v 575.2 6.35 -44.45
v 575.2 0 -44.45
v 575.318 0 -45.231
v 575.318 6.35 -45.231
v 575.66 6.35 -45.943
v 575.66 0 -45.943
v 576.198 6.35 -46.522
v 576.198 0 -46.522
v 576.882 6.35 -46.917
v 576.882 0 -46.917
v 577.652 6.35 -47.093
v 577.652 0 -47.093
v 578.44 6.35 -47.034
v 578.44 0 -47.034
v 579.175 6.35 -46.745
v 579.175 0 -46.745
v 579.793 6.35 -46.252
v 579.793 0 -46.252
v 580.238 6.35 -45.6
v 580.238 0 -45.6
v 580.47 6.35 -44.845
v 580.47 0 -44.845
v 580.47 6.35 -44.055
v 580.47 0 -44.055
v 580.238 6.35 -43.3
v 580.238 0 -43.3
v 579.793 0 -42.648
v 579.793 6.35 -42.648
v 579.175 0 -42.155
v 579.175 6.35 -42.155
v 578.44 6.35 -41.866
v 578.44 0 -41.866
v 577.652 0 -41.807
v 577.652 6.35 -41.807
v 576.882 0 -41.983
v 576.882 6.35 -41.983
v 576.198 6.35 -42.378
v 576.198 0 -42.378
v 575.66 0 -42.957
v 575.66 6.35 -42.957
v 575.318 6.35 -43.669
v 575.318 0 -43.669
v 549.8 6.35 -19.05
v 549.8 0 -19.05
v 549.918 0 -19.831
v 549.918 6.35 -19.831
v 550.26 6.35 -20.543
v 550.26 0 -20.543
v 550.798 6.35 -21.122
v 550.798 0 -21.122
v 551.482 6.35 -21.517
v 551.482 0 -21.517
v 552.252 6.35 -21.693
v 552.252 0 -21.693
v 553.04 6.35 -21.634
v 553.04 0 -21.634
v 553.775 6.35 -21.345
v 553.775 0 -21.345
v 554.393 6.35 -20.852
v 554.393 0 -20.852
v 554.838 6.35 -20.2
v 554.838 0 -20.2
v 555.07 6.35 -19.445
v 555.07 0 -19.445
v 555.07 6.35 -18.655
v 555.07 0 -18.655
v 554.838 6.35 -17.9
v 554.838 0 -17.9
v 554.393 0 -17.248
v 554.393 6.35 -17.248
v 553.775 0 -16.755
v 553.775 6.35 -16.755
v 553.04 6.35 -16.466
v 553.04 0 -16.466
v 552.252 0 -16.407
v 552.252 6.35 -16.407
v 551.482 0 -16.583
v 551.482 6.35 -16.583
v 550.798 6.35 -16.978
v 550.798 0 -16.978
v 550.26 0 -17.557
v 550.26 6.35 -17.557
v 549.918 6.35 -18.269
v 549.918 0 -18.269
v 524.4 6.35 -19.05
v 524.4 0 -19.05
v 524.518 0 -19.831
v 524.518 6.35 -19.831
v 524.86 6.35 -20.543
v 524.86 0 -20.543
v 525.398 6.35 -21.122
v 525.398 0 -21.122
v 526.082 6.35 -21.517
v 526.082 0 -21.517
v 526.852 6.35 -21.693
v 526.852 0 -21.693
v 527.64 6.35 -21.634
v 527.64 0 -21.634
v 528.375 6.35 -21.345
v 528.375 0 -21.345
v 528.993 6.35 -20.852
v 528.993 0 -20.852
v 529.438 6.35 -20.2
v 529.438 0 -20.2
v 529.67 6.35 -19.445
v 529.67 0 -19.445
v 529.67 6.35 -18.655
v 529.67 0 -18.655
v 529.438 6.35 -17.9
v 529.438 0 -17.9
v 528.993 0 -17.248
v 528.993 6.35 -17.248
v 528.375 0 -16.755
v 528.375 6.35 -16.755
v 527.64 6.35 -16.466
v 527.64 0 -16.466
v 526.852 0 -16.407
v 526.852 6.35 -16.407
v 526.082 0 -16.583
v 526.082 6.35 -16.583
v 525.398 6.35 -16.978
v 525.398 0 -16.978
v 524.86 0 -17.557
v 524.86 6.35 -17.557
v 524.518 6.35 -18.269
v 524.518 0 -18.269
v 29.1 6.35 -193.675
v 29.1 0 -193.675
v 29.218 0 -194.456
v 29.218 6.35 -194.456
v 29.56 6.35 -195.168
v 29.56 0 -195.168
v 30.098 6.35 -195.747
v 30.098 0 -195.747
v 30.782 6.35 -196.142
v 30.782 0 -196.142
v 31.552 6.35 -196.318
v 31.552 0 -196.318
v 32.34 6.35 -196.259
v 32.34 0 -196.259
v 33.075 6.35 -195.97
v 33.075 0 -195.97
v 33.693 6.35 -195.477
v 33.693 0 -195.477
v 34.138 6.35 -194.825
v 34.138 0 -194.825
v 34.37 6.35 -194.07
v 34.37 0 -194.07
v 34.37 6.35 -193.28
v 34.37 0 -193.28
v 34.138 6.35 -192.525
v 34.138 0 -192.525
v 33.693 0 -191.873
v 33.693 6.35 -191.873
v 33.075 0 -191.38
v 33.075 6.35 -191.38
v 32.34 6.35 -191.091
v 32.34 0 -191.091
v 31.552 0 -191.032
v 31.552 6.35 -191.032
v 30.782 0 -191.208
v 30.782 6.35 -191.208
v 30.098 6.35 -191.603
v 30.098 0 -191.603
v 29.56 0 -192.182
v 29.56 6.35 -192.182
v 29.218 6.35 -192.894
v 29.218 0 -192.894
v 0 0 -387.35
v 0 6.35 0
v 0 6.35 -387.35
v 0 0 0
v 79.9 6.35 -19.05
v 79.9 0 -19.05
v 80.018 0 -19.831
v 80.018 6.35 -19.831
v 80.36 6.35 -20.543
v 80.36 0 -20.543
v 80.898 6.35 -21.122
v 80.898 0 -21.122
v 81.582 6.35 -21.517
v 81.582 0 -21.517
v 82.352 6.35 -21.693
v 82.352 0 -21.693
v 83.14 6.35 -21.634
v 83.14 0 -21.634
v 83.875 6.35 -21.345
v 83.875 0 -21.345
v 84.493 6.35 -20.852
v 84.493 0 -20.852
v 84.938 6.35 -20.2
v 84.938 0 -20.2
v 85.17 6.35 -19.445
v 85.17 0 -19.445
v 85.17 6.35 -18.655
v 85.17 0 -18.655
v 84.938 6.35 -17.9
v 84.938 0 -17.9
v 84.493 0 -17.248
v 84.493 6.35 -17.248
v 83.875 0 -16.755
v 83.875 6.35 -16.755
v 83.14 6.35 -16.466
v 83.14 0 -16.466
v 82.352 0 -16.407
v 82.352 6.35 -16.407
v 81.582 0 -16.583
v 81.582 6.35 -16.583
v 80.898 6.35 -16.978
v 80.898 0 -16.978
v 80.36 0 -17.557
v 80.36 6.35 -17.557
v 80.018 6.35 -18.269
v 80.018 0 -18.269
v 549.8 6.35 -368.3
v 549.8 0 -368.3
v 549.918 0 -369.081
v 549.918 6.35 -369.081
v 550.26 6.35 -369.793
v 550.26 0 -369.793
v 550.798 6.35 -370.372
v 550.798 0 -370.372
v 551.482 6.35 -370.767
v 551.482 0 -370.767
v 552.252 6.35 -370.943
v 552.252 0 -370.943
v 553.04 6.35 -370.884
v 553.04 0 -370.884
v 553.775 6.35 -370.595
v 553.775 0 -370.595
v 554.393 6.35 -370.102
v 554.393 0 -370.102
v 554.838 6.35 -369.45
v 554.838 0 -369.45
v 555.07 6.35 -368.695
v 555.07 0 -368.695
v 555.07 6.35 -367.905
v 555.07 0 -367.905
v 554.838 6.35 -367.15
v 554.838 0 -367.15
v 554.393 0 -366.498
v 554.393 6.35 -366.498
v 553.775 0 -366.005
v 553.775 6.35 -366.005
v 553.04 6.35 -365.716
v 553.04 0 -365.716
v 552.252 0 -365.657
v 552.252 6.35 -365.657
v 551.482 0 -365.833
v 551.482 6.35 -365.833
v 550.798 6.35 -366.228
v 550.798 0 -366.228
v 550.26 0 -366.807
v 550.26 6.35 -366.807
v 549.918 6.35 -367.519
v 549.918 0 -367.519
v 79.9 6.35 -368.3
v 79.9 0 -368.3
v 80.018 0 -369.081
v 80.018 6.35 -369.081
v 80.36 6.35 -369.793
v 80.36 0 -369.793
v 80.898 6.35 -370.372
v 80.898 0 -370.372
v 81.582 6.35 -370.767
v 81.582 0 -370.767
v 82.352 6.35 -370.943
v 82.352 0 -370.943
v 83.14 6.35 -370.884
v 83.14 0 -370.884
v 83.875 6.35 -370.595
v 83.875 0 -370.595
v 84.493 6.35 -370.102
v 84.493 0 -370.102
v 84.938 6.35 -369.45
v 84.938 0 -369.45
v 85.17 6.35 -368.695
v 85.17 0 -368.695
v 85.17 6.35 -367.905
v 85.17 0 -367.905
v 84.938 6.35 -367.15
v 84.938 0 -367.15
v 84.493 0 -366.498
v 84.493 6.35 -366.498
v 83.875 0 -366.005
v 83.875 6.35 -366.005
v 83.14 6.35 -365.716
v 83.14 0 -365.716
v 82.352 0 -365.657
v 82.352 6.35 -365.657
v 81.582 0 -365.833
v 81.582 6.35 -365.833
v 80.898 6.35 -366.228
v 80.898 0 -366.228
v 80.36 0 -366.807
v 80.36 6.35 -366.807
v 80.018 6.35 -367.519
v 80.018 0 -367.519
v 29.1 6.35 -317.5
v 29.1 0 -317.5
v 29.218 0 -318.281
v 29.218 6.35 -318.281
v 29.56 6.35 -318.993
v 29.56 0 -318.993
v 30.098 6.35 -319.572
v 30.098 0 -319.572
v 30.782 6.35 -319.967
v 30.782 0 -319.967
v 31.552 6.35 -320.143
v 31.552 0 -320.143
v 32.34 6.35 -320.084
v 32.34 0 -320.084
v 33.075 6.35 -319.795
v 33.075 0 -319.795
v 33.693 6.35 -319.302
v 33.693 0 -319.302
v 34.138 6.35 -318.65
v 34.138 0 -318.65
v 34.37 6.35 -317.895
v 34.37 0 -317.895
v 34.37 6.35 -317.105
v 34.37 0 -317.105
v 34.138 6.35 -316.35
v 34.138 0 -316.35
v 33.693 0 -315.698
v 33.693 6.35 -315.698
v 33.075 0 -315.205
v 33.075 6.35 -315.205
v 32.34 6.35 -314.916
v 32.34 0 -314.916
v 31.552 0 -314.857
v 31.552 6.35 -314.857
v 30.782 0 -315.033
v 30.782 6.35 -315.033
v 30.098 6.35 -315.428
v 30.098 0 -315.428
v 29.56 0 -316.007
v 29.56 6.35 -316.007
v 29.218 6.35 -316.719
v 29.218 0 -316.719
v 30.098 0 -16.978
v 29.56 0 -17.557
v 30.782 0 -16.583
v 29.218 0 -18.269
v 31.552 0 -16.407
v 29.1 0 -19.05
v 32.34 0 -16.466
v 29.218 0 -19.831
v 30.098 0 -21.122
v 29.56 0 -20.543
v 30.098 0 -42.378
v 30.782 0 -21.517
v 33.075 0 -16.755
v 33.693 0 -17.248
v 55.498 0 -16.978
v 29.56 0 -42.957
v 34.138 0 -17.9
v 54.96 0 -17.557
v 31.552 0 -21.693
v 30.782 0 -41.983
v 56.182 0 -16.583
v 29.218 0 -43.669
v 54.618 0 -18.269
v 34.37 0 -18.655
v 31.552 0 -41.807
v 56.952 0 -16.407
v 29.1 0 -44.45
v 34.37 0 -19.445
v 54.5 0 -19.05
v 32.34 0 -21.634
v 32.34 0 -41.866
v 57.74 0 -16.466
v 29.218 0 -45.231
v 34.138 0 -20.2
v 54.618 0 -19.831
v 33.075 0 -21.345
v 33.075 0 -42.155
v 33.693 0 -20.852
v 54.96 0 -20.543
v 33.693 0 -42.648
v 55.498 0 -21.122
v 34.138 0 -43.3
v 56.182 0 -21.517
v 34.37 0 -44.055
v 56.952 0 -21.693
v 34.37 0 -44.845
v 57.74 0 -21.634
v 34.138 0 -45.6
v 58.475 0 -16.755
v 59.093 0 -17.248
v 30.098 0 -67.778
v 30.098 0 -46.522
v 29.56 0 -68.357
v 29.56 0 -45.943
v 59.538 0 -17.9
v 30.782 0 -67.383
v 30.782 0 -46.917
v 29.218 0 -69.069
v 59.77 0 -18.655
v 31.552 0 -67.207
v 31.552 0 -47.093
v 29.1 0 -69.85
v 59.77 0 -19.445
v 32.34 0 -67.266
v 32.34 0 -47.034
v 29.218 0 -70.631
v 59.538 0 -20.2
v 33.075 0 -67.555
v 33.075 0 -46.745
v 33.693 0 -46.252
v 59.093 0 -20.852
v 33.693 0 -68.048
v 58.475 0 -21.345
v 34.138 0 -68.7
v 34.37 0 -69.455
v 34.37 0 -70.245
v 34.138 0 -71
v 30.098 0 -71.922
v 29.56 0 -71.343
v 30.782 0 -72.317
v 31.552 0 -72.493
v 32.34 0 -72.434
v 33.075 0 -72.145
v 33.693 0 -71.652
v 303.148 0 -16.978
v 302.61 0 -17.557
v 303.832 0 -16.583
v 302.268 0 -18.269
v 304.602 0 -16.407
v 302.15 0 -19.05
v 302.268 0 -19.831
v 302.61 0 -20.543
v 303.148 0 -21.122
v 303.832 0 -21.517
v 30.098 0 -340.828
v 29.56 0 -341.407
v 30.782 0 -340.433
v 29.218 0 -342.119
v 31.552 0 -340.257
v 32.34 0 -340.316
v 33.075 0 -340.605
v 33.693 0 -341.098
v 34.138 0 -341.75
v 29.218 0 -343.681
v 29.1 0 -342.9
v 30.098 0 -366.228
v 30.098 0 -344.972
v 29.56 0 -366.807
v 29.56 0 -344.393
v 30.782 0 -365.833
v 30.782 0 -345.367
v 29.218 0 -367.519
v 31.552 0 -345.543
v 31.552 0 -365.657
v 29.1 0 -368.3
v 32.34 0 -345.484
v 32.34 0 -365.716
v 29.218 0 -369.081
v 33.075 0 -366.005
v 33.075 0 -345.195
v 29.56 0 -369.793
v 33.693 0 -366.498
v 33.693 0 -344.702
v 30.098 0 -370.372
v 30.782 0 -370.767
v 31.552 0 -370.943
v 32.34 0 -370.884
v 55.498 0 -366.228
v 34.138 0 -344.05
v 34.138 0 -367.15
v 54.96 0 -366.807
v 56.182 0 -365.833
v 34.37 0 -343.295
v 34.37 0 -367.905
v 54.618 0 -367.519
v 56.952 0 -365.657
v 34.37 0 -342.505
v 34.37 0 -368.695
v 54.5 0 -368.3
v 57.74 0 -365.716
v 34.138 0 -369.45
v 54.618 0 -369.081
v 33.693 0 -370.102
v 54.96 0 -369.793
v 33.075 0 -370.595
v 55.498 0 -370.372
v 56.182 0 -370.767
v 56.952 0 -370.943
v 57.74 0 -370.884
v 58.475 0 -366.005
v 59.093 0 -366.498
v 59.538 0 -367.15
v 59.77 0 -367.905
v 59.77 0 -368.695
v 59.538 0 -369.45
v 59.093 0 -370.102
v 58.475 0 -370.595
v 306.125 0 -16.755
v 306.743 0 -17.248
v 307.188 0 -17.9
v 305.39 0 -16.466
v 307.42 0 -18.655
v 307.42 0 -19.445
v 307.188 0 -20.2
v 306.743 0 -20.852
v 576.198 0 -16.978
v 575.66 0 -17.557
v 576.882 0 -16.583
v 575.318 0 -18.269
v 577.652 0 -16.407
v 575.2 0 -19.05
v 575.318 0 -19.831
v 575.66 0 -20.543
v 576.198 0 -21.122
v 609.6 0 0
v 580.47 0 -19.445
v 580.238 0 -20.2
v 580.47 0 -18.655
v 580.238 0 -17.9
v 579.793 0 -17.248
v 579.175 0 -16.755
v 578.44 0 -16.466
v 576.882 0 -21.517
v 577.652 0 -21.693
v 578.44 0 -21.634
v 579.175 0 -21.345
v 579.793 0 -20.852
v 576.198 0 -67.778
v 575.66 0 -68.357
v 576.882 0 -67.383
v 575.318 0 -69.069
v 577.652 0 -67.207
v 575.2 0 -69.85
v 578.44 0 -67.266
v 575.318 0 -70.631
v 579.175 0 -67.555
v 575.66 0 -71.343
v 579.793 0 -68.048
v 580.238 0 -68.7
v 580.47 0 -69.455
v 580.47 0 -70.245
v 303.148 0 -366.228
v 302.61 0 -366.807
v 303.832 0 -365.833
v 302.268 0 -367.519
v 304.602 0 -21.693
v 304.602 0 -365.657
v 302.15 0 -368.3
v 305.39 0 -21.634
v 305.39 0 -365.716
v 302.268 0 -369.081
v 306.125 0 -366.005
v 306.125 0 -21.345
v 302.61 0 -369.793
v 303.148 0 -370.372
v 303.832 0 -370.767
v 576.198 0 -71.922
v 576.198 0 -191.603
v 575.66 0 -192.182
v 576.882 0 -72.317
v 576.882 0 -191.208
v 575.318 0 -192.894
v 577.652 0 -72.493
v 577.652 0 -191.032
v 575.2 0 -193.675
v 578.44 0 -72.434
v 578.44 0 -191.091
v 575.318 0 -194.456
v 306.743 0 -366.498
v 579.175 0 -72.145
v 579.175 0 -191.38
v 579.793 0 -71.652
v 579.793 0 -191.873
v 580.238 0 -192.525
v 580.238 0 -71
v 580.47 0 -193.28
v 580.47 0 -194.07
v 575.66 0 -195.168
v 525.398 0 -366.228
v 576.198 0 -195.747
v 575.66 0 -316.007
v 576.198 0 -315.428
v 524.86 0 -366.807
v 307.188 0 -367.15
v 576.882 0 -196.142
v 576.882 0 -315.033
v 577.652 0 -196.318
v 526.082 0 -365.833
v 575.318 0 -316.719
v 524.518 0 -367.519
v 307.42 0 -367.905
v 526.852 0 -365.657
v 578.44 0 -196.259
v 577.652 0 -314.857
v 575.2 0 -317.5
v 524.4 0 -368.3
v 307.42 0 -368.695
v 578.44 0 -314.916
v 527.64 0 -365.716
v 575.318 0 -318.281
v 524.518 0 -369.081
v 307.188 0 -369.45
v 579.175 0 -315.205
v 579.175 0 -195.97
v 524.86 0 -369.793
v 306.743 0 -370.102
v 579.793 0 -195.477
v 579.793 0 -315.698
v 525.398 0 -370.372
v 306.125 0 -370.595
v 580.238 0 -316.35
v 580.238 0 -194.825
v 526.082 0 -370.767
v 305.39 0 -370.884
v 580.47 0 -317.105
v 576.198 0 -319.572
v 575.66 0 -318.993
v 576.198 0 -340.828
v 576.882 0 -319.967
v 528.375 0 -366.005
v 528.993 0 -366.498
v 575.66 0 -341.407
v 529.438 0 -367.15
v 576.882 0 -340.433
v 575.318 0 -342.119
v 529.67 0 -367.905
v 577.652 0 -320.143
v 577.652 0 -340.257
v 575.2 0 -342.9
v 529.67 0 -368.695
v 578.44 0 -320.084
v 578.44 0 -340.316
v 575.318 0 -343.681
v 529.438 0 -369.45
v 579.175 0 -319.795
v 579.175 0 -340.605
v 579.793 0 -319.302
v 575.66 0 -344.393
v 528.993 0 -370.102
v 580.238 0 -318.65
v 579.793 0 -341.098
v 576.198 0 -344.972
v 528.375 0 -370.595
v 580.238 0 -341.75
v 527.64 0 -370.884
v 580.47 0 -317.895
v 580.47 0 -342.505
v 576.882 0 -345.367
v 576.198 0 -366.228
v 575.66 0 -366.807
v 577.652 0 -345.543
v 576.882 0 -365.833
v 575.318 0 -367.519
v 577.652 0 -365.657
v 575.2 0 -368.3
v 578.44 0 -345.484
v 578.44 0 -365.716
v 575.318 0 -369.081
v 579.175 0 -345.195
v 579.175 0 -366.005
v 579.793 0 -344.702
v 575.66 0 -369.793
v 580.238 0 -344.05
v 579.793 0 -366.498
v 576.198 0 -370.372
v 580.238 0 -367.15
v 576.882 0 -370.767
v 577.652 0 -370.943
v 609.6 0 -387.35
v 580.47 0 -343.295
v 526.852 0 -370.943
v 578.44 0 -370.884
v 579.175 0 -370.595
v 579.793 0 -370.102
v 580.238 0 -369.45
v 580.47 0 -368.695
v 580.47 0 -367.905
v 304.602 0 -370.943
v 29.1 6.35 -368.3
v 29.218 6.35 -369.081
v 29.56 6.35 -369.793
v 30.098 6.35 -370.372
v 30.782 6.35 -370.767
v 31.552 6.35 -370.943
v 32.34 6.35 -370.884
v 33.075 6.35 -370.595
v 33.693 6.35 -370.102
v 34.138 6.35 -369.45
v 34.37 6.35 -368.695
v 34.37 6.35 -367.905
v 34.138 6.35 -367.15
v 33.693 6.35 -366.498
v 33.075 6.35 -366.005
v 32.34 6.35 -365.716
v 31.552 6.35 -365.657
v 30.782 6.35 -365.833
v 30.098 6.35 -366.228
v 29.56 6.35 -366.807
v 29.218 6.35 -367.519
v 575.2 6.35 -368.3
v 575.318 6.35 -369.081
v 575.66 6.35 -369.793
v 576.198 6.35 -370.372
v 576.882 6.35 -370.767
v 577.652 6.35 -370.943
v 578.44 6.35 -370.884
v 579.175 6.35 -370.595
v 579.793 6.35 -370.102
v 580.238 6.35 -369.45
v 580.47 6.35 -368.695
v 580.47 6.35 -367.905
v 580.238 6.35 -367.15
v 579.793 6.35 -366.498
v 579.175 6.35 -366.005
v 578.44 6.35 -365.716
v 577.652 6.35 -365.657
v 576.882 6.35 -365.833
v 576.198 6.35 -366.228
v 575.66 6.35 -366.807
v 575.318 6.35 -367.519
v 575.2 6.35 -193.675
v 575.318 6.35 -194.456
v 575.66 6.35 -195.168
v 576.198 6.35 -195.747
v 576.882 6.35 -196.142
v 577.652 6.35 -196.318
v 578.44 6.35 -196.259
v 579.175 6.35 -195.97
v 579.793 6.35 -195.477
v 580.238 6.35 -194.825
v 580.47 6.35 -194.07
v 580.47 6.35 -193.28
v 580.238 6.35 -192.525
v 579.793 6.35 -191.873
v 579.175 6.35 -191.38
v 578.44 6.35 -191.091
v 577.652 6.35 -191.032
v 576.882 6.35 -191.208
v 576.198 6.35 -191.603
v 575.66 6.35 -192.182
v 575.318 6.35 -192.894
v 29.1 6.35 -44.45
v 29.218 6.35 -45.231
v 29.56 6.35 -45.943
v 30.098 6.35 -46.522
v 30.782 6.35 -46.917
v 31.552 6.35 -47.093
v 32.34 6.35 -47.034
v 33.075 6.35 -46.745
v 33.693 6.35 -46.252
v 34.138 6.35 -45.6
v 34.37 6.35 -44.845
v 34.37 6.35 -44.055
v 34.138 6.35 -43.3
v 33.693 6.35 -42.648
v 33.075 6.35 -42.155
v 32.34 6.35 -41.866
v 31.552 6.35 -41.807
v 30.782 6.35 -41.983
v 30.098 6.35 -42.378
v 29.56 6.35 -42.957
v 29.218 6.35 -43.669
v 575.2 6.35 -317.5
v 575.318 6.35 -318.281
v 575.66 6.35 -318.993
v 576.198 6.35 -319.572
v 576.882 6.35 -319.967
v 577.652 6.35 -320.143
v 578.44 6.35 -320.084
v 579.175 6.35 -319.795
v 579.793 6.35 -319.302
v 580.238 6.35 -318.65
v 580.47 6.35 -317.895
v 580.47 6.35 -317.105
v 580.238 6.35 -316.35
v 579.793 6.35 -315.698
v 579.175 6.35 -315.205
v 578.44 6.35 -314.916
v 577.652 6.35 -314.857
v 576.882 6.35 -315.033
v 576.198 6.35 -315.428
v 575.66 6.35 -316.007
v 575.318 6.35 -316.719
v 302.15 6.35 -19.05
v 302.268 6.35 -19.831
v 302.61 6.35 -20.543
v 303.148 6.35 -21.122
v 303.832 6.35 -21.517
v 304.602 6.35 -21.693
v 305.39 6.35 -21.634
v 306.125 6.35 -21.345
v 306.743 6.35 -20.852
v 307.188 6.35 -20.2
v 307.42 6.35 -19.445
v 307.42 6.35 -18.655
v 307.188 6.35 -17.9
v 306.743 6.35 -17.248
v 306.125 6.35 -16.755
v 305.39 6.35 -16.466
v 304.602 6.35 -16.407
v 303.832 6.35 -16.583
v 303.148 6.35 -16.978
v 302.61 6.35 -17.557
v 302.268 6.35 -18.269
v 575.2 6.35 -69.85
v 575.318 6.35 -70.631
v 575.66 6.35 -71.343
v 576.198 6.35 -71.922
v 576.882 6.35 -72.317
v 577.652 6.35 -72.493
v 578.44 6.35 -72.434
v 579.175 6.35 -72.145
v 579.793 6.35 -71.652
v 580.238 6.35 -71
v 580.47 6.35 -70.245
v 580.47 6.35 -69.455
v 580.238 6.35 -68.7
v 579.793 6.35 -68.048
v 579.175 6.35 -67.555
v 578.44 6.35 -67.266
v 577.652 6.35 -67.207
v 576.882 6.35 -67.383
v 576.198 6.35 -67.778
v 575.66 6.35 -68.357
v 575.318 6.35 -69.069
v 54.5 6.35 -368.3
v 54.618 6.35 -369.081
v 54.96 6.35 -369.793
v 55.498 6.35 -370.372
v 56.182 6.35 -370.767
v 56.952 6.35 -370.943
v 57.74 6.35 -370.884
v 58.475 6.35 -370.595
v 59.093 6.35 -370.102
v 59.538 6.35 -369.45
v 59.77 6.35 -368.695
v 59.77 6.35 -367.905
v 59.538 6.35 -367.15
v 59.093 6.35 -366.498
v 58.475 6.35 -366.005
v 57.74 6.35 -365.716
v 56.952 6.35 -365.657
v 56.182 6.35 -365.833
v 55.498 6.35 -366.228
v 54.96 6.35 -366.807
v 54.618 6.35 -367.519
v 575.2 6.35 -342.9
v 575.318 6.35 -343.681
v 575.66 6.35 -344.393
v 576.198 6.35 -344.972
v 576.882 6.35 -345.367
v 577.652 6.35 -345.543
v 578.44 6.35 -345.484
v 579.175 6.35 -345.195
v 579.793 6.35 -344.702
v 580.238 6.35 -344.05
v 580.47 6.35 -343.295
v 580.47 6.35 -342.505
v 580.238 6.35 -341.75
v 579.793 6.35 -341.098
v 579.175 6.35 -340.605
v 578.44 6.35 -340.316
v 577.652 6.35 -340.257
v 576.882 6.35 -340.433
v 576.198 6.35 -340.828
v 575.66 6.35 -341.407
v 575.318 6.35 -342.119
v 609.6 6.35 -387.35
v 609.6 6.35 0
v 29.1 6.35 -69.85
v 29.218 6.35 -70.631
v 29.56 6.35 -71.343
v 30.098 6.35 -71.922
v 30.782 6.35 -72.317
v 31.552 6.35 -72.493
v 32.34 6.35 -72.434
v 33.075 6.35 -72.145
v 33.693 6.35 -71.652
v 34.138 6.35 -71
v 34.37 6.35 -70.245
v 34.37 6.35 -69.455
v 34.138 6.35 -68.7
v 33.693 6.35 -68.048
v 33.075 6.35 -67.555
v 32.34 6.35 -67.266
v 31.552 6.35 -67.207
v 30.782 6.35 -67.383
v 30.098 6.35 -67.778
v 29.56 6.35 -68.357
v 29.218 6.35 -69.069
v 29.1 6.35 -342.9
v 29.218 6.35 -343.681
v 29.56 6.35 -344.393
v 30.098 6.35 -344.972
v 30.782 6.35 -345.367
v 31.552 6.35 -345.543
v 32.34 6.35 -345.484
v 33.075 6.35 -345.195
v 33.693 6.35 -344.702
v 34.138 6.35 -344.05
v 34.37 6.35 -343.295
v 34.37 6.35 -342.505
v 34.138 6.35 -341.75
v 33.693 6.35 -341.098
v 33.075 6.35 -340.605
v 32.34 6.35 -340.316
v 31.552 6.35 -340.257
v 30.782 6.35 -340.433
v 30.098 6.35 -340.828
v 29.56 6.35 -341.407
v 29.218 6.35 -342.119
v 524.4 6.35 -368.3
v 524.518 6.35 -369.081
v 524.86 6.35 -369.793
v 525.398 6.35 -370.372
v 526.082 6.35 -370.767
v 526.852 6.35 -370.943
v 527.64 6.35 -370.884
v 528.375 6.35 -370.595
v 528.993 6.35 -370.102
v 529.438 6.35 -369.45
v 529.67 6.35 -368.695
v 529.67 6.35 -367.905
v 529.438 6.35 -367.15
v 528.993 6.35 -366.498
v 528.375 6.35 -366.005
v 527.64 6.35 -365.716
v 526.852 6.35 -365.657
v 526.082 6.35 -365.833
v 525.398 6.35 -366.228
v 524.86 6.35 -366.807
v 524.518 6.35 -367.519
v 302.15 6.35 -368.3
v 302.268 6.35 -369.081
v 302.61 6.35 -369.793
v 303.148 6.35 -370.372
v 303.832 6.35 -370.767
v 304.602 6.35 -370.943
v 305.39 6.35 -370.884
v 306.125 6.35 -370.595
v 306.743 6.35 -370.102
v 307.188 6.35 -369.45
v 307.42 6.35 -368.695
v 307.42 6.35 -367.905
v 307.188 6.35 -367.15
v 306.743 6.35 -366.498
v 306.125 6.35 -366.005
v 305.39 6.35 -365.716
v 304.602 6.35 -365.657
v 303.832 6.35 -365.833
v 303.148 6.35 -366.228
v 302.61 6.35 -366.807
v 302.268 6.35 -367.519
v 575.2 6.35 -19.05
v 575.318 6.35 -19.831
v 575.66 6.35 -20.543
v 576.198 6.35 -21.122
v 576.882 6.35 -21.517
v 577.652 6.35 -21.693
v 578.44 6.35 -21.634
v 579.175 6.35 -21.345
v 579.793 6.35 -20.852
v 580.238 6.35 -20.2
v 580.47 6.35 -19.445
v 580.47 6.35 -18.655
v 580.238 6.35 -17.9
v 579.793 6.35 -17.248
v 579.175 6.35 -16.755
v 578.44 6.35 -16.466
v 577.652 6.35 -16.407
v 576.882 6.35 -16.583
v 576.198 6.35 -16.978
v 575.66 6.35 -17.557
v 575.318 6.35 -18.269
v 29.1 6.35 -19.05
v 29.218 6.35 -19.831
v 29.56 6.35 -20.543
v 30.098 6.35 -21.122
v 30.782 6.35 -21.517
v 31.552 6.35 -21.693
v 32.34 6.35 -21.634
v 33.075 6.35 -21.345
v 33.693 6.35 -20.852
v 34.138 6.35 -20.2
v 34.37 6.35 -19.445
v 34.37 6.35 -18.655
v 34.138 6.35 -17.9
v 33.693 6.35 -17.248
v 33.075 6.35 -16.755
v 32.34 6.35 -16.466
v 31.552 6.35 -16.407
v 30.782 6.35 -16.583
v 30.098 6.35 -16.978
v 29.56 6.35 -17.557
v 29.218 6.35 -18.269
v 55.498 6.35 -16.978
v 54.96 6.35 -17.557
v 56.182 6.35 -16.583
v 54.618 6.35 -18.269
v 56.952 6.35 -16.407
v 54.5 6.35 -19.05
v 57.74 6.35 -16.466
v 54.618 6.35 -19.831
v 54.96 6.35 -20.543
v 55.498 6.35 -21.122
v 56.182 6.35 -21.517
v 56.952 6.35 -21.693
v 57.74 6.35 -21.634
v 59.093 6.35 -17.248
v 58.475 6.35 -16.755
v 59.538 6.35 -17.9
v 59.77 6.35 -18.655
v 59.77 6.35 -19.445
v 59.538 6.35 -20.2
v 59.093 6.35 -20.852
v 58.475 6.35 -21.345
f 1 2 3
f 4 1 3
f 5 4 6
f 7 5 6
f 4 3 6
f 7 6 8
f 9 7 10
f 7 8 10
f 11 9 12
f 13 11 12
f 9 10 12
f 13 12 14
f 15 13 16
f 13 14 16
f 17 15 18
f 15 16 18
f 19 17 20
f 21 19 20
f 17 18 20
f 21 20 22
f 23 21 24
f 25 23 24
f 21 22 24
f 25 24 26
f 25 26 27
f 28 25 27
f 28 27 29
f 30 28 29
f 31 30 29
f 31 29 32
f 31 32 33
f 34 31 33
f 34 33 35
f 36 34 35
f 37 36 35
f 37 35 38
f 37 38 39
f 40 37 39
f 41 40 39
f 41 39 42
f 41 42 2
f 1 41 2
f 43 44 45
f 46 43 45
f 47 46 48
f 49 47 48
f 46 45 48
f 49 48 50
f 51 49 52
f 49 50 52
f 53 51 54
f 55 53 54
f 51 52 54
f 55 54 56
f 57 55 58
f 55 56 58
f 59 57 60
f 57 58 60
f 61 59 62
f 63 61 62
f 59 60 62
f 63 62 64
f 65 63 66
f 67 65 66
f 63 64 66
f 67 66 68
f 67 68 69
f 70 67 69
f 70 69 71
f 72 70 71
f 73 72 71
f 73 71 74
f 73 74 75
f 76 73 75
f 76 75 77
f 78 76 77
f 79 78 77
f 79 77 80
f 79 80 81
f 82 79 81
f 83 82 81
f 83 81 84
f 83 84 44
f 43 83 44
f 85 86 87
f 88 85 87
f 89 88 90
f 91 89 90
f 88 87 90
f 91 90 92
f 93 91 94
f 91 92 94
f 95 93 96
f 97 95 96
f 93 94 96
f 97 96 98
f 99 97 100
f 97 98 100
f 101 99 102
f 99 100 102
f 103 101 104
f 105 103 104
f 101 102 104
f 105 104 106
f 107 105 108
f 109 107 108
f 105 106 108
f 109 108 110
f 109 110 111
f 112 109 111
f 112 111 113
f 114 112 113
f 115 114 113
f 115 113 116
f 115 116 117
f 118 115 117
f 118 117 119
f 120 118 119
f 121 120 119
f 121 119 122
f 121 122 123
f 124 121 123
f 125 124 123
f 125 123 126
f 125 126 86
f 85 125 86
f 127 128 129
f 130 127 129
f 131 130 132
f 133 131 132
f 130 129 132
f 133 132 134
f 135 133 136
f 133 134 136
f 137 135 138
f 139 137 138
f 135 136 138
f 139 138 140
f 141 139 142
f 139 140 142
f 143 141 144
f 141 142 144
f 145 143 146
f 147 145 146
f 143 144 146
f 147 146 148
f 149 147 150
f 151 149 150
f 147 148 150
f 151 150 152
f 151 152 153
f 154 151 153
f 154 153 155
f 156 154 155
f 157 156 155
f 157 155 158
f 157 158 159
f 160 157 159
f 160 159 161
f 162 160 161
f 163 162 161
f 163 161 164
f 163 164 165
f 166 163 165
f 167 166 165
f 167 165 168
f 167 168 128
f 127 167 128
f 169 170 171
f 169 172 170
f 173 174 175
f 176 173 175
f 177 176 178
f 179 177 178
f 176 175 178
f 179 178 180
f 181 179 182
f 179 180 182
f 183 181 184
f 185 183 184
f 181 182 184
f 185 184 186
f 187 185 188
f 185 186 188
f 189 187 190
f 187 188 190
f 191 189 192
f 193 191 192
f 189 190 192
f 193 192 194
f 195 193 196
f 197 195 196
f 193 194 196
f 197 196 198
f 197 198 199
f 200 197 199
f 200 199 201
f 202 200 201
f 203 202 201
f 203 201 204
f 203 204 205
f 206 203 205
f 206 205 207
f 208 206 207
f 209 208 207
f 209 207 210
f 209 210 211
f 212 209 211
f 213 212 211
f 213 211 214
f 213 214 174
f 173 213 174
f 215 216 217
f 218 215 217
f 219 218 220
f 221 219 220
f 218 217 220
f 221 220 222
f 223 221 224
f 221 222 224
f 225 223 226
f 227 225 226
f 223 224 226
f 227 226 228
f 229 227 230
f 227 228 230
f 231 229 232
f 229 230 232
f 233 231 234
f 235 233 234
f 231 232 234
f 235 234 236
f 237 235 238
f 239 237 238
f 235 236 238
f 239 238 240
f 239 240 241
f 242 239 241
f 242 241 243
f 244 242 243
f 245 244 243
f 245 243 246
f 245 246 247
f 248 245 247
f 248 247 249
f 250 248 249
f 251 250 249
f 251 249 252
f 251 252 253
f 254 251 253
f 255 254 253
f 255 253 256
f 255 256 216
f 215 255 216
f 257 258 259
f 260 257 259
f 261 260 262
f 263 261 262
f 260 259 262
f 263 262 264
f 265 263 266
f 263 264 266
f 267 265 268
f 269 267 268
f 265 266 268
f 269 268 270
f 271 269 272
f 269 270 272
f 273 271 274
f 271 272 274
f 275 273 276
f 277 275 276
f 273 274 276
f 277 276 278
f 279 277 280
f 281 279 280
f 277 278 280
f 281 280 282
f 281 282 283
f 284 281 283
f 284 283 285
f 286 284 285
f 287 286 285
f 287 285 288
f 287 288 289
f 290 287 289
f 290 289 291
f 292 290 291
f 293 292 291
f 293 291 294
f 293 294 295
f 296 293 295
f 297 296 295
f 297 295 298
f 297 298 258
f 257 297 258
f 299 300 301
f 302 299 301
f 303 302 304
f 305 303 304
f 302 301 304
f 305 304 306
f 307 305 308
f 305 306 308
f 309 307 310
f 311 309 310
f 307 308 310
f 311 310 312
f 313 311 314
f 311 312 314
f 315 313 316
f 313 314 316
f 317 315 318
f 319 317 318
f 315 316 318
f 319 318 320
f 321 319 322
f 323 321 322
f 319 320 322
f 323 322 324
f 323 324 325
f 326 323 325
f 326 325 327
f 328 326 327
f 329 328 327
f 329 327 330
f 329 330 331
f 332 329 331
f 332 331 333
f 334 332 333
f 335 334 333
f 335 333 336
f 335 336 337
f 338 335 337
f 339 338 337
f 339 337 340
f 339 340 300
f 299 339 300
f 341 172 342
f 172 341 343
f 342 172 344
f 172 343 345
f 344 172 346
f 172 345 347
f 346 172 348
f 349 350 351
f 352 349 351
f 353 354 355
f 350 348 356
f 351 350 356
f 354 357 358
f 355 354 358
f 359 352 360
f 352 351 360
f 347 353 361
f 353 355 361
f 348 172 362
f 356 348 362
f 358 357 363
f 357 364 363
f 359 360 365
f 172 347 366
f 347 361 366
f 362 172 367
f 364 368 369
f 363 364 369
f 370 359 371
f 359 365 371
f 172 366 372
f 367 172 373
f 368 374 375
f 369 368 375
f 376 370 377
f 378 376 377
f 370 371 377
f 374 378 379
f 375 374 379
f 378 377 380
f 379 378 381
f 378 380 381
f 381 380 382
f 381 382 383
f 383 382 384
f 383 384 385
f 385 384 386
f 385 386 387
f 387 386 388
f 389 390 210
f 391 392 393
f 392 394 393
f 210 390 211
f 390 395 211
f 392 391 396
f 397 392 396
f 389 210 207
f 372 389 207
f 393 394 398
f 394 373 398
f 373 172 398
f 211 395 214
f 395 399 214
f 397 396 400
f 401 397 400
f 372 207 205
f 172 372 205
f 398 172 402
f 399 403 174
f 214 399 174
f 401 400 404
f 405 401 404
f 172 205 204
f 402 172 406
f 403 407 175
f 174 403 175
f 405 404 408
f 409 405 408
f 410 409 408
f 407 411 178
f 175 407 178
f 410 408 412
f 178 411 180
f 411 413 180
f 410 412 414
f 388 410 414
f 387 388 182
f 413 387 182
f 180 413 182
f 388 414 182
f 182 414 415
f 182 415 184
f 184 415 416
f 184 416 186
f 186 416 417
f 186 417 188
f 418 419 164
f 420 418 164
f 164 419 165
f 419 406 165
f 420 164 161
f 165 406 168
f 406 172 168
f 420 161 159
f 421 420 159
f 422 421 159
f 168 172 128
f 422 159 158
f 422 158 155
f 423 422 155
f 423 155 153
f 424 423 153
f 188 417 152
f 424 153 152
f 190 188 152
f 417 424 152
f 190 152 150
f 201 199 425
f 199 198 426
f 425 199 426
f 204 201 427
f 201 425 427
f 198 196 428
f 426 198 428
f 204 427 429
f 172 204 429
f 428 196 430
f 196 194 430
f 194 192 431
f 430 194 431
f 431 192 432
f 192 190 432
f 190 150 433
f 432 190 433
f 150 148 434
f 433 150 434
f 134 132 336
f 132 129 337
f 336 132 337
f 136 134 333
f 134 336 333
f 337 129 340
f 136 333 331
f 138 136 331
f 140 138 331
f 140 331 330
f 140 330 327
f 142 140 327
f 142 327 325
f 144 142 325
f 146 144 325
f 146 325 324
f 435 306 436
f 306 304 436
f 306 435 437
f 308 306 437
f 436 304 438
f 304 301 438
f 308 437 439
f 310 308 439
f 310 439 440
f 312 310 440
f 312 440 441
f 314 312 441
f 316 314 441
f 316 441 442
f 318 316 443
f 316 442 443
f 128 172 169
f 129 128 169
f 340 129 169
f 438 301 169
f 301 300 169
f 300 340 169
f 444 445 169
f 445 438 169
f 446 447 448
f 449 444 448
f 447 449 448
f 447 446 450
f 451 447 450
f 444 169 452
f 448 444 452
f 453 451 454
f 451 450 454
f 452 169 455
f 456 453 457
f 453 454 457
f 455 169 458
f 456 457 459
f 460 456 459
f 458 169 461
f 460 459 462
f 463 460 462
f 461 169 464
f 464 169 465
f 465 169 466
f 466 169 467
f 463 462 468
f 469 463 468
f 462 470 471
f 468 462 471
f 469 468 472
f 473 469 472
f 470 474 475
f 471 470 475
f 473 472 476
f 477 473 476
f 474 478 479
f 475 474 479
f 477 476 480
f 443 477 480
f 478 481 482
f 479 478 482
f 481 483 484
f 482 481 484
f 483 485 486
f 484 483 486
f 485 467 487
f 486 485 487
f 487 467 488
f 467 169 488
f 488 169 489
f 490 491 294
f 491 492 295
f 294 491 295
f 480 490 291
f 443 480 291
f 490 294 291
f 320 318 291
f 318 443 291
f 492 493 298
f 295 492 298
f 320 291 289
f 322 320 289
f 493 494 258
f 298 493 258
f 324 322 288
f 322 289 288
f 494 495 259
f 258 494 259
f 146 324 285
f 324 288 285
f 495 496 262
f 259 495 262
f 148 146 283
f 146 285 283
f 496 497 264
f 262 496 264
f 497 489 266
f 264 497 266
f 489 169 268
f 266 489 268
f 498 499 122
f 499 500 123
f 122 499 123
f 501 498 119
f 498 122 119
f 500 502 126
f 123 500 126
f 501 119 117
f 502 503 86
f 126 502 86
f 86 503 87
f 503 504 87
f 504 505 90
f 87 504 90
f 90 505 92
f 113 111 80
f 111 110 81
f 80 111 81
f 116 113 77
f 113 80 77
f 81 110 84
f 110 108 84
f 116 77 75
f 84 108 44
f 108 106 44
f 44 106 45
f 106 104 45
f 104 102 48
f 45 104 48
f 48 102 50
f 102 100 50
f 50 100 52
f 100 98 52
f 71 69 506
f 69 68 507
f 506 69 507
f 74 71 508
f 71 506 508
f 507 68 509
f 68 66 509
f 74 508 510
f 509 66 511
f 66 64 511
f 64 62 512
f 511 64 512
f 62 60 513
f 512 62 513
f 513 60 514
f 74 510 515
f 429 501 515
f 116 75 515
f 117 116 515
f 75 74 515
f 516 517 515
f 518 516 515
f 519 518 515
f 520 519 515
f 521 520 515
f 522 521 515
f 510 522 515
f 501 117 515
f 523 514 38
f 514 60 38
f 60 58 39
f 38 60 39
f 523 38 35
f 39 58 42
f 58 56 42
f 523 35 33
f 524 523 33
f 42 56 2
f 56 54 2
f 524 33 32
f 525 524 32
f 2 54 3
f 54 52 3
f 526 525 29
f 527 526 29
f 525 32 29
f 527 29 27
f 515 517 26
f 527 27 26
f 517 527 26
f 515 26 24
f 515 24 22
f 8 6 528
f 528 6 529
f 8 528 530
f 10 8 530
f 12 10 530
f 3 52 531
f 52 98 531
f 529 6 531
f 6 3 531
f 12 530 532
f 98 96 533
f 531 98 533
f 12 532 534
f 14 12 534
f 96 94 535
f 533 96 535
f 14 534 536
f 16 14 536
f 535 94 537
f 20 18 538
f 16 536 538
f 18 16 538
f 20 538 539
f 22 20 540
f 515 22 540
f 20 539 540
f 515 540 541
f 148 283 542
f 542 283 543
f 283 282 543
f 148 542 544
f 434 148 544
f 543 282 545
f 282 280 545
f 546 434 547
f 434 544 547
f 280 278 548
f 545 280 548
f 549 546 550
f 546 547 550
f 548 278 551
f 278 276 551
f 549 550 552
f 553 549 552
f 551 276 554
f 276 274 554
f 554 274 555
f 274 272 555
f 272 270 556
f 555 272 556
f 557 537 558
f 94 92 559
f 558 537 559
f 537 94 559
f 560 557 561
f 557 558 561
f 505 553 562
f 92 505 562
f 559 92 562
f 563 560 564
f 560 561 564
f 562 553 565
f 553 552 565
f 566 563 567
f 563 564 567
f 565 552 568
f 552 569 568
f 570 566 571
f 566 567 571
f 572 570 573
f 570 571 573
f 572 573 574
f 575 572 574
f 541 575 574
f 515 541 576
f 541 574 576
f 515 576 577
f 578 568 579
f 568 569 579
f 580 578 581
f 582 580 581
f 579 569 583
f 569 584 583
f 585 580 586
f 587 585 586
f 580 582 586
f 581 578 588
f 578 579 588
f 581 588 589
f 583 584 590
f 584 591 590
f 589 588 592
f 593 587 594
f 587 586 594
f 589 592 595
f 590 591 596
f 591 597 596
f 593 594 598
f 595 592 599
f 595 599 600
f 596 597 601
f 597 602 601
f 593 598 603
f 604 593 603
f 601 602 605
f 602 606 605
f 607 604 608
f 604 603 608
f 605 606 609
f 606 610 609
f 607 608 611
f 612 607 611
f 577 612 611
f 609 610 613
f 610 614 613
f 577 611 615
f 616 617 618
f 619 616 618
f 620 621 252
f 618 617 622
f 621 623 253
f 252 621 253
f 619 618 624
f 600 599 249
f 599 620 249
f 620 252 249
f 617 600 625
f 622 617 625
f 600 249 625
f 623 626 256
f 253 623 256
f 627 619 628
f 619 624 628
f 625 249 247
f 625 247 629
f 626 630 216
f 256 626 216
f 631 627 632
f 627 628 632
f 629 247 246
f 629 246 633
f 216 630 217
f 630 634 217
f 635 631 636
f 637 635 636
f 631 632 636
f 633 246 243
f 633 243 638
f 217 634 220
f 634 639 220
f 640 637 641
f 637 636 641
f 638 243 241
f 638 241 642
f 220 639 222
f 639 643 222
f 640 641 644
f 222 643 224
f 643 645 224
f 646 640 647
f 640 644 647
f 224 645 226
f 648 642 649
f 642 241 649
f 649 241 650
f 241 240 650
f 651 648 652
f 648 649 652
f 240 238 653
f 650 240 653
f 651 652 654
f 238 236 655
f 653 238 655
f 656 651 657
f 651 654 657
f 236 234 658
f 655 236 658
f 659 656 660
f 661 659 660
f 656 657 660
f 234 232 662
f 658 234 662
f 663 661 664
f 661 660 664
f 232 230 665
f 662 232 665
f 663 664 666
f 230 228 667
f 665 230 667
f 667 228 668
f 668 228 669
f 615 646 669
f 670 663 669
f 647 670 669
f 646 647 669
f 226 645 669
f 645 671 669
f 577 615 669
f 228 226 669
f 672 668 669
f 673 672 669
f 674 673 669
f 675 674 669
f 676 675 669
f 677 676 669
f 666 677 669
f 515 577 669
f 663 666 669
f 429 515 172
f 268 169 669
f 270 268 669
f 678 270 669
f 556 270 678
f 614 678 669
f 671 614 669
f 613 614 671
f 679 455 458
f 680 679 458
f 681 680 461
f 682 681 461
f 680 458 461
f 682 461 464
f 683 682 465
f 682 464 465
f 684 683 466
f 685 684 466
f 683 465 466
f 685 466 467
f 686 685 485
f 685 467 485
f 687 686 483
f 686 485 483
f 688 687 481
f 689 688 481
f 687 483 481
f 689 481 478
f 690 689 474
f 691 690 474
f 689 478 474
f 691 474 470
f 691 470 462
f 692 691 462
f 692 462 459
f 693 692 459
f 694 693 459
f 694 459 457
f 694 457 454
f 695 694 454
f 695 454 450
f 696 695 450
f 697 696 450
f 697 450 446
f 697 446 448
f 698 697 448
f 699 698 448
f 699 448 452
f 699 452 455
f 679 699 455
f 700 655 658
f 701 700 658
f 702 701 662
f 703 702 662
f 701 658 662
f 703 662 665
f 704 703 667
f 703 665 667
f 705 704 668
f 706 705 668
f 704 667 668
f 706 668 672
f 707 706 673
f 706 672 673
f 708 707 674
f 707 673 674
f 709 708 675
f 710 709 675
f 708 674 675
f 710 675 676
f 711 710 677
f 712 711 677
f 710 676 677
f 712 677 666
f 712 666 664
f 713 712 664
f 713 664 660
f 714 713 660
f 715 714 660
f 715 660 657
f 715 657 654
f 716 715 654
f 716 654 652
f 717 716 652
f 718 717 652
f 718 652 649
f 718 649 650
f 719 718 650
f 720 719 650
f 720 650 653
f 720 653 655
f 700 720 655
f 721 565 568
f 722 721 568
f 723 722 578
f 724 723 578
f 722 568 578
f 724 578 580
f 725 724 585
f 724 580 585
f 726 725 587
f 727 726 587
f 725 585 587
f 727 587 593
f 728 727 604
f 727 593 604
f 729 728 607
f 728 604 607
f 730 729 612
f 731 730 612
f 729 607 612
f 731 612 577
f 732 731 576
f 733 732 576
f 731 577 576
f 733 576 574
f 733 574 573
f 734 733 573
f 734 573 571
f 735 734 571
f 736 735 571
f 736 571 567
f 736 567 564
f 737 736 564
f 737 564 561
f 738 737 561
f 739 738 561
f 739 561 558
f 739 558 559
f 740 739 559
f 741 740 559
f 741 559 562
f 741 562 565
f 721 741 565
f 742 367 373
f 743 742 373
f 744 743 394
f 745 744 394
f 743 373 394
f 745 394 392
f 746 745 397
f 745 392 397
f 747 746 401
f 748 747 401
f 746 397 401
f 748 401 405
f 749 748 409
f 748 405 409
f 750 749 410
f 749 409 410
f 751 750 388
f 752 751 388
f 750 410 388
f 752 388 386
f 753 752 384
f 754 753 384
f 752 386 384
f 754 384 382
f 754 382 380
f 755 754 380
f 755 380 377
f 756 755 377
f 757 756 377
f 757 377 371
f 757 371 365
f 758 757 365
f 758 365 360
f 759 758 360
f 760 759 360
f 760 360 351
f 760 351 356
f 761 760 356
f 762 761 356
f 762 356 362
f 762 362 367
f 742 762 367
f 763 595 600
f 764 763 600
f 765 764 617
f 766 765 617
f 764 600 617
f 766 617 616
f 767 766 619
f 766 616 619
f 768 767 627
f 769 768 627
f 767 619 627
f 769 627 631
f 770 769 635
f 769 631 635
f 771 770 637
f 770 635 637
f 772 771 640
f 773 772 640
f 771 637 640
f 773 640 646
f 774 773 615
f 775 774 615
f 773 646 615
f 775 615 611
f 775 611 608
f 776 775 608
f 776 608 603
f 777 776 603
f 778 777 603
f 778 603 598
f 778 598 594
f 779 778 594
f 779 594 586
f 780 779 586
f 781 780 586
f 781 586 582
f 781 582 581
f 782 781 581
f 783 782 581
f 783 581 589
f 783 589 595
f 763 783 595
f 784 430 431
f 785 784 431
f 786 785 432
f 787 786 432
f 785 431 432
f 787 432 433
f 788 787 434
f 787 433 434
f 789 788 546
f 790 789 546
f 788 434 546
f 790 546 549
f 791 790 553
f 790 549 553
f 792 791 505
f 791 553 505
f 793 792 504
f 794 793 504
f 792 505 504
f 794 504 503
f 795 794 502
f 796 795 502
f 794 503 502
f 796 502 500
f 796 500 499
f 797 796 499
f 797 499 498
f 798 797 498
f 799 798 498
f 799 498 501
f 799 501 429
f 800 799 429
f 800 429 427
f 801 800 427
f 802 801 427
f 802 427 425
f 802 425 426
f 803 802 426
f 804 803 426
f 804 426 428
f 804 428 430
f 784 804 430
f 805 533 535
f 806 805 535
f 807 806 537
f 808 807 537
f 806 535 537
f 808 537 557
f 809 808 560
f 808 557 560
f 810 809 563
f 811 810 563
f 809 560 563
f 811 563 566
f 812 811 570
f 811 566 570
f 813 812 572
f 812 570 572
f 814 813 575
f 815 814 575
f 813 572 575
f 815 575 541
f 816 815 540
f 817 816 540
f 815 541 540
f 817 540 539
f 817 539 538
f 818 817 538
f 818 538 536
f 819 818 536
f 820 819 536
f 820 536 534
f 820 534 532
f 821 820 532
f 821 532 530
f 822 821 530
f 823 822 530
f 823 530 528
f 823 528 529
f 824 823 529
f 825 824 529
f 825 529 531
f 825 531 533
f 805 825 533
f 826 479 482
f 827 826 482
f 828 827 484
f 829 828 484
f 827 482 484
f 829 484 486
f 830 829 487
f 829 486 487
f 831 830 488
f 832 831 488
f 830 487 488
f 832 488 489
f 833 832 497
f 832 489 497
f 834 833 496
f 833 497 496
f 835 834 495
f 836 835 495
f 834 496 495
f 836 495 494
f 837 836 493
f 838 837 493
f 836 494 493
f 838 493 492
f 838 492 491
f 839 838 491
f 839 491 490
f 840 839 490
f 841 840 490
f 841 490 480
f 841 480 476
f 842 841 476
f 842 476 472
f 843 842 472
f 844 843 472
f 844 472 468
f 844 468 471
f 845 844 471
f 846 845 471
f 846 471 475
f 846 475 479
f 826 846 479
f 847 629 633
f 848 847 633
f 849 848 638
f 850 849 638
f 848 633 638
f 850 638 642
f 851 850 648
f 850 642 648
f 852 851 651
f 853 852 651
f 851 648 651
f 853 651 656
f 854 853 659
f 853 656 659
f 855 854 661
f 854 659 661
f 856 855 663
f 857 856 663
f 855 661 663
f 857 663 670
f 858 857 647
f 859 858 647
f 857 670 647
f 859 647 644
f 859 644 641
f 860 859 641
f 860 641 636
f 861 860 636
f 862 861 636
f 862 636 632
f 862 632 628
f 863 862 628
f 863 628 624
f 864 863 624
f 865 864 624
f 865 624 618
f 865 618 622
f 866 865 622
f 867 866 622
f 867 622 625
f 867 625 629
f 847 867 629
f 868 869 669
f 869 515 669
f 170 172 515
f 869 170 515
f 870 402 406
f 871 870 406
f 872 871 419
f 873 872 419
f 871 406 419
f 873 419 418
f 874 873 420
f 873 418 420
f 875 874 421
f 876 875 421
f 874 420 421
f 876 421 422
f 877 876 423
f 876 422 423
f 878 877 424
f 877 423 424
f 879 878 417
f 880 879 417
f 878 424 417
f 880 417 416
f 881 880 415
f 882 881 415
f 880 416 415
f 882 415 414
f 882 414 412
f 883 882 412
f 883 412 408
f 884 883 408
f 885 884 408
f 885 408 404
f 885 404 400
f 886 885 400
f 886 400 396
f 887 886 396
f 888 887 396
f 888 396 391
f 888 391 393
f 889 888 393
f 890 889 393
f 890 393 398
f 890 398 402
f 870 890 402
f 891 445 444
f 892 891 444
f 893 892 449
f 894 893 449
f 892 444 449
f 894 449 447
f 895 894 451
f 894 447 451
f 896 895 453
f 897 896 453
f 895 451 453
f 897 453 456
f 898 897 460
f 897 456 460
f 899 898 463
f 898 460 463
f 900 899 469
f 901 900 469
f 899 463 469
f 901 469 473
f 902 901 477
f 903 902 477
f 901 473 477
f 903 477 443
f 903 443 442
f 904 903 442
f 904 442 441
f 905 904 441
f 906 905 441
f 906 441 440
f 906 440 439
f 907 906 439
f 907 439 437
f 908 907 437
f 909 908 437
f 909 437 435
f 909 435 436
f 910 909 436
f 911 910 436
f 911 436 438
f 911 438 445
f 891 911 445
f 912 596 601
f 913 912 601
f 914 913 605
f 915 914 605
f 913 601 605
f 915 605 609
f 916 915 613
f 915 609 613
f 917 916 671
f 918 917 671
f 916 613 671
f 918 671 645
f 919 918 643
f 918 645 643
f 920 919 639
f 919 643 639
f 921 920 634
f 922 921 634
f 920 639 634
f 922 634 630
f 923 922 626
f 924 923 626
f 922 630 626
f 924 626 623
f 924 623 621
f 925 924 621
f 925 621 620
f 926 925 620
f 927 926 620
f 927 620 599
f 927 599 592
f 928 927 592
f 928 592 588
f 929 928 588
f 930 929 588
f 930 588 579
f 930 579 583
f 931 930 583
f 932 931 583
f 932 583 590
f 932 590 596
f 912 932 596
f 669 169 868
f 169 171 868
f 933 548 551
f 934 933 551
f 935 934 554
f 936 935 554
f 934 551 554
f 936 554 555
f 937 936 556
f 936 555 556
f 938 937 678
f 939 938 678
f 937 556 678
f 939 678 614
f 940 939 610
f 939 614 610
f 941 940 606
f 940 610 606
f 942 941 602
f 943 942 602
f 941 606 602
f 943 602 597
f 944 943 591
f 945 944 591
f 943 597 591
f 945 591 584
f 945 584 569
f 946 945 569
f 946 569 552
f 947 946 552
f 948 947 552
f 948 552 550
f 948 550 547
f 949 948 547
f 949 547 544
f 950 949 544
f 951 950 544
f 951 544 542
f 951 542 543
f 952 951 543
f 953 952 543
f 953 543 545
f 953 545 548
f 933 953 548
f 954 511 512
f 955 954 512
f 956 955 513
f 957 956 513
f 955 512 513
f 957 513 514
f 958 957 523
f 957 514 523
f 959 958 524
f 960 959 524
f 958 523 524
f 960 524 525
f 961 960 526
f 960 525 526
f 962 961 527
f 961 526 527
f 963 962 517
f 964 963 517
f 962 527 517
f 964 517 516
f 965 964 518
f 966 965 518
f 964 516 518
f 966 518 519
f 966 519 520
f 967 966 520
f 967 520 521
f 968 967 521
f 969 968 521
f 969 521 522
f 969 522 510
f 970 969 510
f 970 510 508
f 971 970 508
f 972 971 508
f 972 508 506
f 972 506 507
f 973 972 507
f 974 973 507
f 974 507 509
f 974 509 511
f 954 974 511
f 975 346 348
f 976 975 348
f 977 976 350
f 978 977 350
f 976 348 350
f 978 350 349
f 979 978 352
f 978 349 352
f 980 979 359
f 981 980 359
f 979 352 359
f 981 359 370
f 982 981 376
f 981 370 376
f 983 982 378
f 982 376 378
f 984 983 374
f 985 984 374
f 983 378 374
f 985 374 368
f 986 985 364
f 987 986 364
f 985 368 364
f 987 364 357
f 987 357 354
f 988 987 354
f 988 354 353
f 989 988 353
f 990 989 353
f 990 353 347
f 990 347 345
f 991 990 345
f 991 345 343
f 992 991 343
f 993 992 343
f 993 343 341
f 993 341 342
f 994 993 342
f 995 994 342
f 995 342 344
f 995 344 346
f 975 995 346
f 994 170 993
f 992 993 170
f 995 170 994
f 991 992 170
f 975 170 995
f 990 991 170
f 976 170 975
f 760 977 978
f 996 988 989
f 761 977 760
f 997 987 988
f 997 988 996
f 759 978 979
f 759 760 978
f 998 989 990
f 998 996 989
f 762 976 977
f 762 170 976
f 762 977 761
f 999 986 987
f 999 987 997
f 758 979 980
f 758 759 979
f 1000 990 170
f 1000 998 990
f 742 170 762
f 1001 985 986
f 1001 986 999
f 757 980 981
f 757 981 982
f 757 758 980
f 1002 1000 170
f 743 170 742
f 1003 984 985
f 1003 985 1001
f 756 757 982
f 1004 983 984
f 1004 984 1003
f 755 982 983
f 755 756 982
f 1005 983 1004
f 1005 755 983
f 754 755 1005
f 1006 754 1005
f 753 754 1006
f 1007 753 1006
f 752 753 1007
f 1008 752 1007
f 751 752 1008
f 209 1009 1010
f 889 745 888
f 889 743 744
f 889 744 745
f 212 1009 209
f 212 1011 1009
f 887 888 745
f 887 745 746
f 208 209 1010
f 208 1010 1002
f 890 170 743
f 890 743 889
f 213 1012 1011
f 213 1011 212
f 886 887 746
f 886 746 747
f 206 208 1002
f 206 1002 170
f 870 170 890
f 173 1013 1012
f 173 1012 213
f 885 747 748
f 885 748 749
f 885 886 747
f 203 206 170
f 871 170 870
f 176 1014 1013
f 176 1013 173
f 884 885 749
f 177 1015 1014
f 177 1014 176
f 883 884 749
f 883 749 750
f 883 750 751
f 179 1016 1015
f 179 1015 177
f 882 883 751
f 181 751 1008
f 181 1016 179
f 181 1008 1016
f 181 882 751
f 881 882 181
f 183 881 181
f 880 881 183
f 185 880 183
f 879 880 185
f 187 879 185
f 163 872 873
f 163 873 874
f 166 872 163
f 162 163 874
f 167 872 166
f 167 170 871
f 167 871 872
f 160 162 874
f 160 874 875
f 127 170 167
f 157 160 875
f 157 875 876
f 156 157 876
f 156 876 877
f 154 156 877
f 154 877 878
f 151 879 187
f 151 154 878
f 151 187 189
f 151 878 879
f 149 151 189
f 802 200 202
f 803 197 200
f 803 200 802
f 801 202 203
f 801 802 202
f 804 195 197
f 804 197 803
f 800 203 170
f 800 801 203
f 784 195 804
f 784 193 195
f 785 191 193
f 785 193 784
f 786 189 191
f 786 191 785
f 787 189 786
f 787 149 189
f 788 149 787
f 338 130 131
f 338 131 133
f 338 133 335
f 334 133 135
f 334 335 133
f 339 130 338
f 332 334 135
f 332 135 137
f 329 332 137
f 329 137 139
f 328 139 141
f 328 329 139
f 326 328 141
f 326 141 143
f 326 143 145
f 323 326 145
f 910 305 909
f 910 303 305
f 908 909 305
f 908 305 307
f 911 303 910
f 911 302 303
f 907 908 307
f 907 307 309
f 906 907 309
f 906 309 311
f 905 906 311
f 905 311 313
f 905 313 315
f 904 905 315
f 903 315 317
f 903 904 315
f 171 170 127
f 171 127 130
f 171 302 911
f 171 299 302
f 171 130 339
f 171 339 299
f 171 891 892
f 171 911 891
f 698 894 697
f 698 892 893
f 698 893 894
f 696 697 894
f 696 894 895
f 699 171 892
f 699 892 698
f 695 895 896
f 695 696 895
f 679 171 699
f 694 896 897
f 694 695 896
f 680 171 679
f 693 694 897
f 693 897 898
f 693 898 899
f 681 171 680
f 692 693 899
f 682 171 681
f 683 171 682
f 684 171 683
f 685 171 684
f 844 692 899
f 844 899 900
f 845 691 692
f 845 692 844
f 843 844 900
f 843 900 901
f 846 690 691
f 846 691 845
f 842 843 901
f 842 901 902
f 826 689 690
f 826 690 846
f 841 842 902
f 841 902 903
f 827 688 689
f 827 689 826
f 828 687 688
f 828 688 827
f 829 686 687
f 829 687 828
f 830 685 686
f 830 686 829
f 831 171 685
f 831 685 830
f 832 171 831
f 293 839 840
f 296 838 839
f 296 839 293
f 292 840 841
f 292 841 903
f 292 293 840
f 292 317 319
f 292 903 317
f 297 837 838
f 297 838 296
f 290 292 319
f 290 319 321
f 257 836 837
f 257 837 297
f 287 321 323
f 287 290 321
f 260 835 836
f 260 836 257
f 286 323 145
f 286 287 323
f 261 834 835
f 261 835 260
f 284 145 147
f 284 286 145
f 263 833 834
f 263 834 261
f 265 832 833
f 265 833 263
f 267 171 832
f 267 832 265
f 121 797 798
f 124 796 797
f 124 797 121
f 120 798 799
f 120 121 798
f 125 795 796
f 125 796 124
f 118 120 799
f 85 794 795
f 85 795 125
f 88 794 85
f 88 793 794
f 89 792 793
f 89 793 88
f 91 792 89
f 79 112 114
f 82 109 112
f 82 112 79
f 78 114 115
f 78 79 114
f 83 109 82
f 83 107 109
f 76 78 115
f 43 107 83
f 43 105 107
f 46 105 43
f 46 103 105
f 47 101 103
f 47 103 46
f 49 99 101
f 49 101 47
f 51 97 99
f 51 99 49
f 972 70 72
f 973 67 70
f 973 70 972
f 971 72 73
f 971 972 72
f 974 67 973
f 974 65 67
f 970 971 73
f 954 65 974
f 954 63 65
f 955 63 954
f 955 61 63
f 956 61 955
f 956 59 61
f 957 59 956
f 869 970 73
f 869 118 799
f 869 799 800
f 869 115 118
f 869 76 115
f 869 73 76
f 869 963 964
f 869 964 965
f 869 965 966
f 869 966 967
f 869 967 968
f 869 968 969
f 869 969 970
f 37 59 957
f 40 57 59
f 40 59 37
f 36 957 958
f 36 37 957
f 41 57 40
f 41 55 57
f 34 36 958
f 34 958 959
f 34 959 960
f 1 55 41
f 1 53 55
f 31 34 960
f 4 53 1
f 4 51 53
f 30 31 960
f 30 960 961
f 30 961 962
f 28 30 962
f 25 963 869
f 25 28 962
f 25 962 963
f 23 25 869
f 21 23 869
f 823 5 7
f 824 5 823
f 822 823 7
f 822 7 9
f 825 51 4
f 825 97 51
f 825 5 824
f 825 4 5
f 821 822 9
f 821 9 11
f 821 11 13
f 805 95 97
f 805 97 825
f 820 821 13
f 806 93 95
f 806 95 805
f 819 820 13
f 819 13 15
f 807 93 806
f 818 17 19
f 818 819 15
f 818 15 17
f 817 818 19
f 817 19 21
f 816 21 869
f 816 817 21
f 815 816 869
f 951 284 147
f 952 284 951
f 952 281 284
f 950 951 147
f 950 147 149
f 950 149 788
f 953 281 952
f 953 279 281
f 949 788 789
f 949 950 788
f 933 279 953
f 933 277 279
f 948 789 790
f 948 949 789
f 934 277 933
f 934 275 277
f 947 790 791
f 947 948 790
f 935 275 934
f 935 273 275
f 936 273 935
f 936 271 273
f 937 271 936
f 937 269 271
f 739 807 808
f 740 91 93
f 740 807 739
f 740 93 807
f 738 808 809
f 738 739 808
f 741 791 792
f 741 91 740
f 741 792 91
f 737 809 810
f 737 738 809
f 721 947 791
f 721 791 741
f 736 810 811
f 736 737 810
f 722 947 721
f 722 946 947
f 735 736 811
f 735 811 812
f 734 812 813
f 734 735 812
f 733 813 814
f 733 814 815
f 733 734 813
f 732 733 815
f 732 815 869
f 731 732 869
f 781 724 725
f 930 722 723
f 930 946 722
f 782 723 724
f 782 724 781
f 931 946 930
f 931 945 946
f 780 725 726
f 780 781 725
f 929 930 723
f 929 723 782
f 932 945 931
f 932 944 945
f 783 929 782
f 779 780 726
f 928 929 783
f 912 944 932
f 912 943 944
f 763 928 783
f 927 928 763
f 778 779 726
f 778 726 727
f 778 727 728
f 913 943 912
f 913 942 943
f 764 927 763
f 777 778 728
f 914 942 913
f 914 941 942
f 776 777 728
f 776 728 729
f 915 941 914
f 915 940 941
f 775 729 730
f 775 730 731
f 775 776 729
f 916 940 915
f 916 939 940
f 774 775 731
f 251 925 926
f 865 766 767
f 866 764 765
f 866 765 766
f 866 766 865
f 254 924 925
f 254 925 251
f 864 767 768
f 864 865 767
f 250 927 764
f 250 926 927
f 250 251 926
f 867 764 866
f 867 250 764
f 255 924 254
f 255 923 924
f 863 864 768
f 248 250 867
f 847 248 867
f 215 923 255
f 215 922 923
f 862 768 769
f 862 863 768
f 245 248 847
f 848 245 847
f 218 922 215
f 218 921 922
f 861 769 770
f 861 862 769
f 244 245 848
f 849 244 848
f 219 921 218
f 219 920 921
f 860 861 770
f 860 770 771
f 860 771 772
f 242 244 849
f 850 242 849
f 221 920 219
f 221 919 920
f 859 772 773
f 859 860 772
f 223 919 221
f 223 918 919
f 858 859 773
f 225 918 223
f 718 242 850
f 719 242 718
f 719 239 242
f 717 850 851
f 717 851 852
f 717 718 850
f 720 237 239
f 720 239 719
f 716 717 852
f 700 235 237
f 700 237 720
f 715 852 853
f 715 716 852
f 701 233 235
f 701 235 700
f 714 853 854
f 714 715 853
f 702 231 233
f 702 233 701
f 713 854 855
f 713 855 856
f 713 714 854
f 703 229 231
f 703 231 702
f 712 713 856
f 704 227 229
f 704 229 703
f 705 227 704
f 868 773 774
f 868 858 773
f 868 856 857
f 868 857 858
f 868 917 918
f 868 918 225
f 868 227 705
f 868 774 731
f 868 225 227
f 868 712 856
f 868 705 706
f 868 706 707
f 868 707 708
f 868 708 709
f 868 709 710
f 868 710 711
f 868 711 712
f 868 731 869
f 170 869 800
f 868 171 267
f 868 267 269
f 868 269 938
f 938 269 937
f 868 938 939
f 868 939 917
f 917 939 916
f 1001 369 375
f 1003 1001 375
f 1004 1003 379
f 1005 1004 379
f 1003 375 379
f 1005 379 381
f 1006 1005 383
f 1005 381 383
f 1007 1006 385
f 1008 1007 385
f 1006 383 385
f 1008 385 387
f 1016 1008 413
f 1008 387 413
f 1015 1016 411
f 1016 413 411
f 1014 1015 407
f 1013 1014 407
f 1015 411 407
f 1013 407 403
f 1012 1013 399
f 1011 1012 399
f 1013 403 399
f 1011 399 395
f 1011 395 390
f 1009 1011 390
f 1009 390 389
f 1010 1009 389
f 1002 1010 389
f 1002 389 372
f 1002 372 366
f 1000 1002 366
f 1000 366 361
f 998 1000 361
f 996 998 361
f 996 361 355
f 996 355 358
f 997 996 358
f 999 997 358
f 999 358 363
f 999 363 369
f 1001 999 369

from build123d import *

# Parameters (mm, degrees)
SKETCH1_W                  = 609.6
SKETCH1_H                  = 609.6
BOSS_EXTRUDE1_DEPTH        = 6.35
SKETCH2_W                  = 609.6
SKETCH2_H                  = 222.25
BOSS_EXTRUDE2_DEPTH        = 25.4
F_5_3_5_3_DIAMETER_HOLE1_D = 5.3
CUT_EXTRUDE1_REACH         = 864.689
SKETCH6_W                  = 609.6
SKETCH6_H                  = 222.25


with BuildPart() as part:
    # Sketch1 → Boss-Extrude1 (new body)
    with BuildSketch(Plane(origin=(0, 0, 0), x_dir=(1, 0, 0), z_dir=(0, 1, 0))):
        with Locations((304.8, 304.8)):
            Rectangle(SKETCH1_W, SKETCH1_H)
    extrude(amount=BOSS_EXTRUDE1_DEPTH)

    # Sketch2 → Boss-Extrude2 (add)
    with BuildSketch(Plane(origin=(0, 6.35, 0), x_dir=(1, 0, 0), z_dir=(0, 1, 0))):
        with Locations((304.8, 498.475)):
            Rectangle(SKETCH2_W, SKETCH2_H)
    extrude(amount=BOSS_EXTRUDE2_DEPTH)

    # Ø5.3 (5.3) Diameter Hole1 (through all)
    with Locations(Plane(origin=(0, 6.35, 0), x_dir=(1, 0, 0), z_dir=(0, 1, 0))):
        with Locations((31.75, 368.3), (57.15, 368.3), (82.55, 368.3), (31.75, 342.9), (31.75, 317.5), (31.75, 69.85), (31.75, 44.45), (31.75, 19.05), (57.15, 19.05), (82.55, 19.05), (304.8, 19.05), (31.75, 193.675), (304.8, 368.3), (577.85, 193.675), (527.05, 368.3), (552.45, 368.3), (577.85, 368.3), (577.85, 342.9), (577.85, 317.5), (577.85, 69.85), (577.85, 44.45), (577.85, 19.05), (552.45, 19.05), (527.05, 19.05)):
            Hole(F_5_3_5_3_DIAMETER_HOLE1_D / 2)

    # Sketch6 → Cut-Extrude1 (cut, up to next)
    with BuildSketch(Plane(origin=(0, 31.75, 0), x_dir=(1, 0, 0), z_dir=(0, 1, 0)), mode=Mode.PRIVATE) as cut_extrude1_sk1:
        with Locations((304.8, 498.475)):
            Rectangle(SKETCH6_W, SKETCH6_H)
    cut_extrude1_tool1 = extrude(cut_extrude1_sk1.sketch, amount=-CUT_EXTRUDE1_REACH, mode=Mode.PRIVATE) & part.part
    add(cut_extrude1_tool1.solids().sort_by_distance((304.8, 31.75, -498.475))[0], mode=Mode.SUBTRACT)


solid = part.part
